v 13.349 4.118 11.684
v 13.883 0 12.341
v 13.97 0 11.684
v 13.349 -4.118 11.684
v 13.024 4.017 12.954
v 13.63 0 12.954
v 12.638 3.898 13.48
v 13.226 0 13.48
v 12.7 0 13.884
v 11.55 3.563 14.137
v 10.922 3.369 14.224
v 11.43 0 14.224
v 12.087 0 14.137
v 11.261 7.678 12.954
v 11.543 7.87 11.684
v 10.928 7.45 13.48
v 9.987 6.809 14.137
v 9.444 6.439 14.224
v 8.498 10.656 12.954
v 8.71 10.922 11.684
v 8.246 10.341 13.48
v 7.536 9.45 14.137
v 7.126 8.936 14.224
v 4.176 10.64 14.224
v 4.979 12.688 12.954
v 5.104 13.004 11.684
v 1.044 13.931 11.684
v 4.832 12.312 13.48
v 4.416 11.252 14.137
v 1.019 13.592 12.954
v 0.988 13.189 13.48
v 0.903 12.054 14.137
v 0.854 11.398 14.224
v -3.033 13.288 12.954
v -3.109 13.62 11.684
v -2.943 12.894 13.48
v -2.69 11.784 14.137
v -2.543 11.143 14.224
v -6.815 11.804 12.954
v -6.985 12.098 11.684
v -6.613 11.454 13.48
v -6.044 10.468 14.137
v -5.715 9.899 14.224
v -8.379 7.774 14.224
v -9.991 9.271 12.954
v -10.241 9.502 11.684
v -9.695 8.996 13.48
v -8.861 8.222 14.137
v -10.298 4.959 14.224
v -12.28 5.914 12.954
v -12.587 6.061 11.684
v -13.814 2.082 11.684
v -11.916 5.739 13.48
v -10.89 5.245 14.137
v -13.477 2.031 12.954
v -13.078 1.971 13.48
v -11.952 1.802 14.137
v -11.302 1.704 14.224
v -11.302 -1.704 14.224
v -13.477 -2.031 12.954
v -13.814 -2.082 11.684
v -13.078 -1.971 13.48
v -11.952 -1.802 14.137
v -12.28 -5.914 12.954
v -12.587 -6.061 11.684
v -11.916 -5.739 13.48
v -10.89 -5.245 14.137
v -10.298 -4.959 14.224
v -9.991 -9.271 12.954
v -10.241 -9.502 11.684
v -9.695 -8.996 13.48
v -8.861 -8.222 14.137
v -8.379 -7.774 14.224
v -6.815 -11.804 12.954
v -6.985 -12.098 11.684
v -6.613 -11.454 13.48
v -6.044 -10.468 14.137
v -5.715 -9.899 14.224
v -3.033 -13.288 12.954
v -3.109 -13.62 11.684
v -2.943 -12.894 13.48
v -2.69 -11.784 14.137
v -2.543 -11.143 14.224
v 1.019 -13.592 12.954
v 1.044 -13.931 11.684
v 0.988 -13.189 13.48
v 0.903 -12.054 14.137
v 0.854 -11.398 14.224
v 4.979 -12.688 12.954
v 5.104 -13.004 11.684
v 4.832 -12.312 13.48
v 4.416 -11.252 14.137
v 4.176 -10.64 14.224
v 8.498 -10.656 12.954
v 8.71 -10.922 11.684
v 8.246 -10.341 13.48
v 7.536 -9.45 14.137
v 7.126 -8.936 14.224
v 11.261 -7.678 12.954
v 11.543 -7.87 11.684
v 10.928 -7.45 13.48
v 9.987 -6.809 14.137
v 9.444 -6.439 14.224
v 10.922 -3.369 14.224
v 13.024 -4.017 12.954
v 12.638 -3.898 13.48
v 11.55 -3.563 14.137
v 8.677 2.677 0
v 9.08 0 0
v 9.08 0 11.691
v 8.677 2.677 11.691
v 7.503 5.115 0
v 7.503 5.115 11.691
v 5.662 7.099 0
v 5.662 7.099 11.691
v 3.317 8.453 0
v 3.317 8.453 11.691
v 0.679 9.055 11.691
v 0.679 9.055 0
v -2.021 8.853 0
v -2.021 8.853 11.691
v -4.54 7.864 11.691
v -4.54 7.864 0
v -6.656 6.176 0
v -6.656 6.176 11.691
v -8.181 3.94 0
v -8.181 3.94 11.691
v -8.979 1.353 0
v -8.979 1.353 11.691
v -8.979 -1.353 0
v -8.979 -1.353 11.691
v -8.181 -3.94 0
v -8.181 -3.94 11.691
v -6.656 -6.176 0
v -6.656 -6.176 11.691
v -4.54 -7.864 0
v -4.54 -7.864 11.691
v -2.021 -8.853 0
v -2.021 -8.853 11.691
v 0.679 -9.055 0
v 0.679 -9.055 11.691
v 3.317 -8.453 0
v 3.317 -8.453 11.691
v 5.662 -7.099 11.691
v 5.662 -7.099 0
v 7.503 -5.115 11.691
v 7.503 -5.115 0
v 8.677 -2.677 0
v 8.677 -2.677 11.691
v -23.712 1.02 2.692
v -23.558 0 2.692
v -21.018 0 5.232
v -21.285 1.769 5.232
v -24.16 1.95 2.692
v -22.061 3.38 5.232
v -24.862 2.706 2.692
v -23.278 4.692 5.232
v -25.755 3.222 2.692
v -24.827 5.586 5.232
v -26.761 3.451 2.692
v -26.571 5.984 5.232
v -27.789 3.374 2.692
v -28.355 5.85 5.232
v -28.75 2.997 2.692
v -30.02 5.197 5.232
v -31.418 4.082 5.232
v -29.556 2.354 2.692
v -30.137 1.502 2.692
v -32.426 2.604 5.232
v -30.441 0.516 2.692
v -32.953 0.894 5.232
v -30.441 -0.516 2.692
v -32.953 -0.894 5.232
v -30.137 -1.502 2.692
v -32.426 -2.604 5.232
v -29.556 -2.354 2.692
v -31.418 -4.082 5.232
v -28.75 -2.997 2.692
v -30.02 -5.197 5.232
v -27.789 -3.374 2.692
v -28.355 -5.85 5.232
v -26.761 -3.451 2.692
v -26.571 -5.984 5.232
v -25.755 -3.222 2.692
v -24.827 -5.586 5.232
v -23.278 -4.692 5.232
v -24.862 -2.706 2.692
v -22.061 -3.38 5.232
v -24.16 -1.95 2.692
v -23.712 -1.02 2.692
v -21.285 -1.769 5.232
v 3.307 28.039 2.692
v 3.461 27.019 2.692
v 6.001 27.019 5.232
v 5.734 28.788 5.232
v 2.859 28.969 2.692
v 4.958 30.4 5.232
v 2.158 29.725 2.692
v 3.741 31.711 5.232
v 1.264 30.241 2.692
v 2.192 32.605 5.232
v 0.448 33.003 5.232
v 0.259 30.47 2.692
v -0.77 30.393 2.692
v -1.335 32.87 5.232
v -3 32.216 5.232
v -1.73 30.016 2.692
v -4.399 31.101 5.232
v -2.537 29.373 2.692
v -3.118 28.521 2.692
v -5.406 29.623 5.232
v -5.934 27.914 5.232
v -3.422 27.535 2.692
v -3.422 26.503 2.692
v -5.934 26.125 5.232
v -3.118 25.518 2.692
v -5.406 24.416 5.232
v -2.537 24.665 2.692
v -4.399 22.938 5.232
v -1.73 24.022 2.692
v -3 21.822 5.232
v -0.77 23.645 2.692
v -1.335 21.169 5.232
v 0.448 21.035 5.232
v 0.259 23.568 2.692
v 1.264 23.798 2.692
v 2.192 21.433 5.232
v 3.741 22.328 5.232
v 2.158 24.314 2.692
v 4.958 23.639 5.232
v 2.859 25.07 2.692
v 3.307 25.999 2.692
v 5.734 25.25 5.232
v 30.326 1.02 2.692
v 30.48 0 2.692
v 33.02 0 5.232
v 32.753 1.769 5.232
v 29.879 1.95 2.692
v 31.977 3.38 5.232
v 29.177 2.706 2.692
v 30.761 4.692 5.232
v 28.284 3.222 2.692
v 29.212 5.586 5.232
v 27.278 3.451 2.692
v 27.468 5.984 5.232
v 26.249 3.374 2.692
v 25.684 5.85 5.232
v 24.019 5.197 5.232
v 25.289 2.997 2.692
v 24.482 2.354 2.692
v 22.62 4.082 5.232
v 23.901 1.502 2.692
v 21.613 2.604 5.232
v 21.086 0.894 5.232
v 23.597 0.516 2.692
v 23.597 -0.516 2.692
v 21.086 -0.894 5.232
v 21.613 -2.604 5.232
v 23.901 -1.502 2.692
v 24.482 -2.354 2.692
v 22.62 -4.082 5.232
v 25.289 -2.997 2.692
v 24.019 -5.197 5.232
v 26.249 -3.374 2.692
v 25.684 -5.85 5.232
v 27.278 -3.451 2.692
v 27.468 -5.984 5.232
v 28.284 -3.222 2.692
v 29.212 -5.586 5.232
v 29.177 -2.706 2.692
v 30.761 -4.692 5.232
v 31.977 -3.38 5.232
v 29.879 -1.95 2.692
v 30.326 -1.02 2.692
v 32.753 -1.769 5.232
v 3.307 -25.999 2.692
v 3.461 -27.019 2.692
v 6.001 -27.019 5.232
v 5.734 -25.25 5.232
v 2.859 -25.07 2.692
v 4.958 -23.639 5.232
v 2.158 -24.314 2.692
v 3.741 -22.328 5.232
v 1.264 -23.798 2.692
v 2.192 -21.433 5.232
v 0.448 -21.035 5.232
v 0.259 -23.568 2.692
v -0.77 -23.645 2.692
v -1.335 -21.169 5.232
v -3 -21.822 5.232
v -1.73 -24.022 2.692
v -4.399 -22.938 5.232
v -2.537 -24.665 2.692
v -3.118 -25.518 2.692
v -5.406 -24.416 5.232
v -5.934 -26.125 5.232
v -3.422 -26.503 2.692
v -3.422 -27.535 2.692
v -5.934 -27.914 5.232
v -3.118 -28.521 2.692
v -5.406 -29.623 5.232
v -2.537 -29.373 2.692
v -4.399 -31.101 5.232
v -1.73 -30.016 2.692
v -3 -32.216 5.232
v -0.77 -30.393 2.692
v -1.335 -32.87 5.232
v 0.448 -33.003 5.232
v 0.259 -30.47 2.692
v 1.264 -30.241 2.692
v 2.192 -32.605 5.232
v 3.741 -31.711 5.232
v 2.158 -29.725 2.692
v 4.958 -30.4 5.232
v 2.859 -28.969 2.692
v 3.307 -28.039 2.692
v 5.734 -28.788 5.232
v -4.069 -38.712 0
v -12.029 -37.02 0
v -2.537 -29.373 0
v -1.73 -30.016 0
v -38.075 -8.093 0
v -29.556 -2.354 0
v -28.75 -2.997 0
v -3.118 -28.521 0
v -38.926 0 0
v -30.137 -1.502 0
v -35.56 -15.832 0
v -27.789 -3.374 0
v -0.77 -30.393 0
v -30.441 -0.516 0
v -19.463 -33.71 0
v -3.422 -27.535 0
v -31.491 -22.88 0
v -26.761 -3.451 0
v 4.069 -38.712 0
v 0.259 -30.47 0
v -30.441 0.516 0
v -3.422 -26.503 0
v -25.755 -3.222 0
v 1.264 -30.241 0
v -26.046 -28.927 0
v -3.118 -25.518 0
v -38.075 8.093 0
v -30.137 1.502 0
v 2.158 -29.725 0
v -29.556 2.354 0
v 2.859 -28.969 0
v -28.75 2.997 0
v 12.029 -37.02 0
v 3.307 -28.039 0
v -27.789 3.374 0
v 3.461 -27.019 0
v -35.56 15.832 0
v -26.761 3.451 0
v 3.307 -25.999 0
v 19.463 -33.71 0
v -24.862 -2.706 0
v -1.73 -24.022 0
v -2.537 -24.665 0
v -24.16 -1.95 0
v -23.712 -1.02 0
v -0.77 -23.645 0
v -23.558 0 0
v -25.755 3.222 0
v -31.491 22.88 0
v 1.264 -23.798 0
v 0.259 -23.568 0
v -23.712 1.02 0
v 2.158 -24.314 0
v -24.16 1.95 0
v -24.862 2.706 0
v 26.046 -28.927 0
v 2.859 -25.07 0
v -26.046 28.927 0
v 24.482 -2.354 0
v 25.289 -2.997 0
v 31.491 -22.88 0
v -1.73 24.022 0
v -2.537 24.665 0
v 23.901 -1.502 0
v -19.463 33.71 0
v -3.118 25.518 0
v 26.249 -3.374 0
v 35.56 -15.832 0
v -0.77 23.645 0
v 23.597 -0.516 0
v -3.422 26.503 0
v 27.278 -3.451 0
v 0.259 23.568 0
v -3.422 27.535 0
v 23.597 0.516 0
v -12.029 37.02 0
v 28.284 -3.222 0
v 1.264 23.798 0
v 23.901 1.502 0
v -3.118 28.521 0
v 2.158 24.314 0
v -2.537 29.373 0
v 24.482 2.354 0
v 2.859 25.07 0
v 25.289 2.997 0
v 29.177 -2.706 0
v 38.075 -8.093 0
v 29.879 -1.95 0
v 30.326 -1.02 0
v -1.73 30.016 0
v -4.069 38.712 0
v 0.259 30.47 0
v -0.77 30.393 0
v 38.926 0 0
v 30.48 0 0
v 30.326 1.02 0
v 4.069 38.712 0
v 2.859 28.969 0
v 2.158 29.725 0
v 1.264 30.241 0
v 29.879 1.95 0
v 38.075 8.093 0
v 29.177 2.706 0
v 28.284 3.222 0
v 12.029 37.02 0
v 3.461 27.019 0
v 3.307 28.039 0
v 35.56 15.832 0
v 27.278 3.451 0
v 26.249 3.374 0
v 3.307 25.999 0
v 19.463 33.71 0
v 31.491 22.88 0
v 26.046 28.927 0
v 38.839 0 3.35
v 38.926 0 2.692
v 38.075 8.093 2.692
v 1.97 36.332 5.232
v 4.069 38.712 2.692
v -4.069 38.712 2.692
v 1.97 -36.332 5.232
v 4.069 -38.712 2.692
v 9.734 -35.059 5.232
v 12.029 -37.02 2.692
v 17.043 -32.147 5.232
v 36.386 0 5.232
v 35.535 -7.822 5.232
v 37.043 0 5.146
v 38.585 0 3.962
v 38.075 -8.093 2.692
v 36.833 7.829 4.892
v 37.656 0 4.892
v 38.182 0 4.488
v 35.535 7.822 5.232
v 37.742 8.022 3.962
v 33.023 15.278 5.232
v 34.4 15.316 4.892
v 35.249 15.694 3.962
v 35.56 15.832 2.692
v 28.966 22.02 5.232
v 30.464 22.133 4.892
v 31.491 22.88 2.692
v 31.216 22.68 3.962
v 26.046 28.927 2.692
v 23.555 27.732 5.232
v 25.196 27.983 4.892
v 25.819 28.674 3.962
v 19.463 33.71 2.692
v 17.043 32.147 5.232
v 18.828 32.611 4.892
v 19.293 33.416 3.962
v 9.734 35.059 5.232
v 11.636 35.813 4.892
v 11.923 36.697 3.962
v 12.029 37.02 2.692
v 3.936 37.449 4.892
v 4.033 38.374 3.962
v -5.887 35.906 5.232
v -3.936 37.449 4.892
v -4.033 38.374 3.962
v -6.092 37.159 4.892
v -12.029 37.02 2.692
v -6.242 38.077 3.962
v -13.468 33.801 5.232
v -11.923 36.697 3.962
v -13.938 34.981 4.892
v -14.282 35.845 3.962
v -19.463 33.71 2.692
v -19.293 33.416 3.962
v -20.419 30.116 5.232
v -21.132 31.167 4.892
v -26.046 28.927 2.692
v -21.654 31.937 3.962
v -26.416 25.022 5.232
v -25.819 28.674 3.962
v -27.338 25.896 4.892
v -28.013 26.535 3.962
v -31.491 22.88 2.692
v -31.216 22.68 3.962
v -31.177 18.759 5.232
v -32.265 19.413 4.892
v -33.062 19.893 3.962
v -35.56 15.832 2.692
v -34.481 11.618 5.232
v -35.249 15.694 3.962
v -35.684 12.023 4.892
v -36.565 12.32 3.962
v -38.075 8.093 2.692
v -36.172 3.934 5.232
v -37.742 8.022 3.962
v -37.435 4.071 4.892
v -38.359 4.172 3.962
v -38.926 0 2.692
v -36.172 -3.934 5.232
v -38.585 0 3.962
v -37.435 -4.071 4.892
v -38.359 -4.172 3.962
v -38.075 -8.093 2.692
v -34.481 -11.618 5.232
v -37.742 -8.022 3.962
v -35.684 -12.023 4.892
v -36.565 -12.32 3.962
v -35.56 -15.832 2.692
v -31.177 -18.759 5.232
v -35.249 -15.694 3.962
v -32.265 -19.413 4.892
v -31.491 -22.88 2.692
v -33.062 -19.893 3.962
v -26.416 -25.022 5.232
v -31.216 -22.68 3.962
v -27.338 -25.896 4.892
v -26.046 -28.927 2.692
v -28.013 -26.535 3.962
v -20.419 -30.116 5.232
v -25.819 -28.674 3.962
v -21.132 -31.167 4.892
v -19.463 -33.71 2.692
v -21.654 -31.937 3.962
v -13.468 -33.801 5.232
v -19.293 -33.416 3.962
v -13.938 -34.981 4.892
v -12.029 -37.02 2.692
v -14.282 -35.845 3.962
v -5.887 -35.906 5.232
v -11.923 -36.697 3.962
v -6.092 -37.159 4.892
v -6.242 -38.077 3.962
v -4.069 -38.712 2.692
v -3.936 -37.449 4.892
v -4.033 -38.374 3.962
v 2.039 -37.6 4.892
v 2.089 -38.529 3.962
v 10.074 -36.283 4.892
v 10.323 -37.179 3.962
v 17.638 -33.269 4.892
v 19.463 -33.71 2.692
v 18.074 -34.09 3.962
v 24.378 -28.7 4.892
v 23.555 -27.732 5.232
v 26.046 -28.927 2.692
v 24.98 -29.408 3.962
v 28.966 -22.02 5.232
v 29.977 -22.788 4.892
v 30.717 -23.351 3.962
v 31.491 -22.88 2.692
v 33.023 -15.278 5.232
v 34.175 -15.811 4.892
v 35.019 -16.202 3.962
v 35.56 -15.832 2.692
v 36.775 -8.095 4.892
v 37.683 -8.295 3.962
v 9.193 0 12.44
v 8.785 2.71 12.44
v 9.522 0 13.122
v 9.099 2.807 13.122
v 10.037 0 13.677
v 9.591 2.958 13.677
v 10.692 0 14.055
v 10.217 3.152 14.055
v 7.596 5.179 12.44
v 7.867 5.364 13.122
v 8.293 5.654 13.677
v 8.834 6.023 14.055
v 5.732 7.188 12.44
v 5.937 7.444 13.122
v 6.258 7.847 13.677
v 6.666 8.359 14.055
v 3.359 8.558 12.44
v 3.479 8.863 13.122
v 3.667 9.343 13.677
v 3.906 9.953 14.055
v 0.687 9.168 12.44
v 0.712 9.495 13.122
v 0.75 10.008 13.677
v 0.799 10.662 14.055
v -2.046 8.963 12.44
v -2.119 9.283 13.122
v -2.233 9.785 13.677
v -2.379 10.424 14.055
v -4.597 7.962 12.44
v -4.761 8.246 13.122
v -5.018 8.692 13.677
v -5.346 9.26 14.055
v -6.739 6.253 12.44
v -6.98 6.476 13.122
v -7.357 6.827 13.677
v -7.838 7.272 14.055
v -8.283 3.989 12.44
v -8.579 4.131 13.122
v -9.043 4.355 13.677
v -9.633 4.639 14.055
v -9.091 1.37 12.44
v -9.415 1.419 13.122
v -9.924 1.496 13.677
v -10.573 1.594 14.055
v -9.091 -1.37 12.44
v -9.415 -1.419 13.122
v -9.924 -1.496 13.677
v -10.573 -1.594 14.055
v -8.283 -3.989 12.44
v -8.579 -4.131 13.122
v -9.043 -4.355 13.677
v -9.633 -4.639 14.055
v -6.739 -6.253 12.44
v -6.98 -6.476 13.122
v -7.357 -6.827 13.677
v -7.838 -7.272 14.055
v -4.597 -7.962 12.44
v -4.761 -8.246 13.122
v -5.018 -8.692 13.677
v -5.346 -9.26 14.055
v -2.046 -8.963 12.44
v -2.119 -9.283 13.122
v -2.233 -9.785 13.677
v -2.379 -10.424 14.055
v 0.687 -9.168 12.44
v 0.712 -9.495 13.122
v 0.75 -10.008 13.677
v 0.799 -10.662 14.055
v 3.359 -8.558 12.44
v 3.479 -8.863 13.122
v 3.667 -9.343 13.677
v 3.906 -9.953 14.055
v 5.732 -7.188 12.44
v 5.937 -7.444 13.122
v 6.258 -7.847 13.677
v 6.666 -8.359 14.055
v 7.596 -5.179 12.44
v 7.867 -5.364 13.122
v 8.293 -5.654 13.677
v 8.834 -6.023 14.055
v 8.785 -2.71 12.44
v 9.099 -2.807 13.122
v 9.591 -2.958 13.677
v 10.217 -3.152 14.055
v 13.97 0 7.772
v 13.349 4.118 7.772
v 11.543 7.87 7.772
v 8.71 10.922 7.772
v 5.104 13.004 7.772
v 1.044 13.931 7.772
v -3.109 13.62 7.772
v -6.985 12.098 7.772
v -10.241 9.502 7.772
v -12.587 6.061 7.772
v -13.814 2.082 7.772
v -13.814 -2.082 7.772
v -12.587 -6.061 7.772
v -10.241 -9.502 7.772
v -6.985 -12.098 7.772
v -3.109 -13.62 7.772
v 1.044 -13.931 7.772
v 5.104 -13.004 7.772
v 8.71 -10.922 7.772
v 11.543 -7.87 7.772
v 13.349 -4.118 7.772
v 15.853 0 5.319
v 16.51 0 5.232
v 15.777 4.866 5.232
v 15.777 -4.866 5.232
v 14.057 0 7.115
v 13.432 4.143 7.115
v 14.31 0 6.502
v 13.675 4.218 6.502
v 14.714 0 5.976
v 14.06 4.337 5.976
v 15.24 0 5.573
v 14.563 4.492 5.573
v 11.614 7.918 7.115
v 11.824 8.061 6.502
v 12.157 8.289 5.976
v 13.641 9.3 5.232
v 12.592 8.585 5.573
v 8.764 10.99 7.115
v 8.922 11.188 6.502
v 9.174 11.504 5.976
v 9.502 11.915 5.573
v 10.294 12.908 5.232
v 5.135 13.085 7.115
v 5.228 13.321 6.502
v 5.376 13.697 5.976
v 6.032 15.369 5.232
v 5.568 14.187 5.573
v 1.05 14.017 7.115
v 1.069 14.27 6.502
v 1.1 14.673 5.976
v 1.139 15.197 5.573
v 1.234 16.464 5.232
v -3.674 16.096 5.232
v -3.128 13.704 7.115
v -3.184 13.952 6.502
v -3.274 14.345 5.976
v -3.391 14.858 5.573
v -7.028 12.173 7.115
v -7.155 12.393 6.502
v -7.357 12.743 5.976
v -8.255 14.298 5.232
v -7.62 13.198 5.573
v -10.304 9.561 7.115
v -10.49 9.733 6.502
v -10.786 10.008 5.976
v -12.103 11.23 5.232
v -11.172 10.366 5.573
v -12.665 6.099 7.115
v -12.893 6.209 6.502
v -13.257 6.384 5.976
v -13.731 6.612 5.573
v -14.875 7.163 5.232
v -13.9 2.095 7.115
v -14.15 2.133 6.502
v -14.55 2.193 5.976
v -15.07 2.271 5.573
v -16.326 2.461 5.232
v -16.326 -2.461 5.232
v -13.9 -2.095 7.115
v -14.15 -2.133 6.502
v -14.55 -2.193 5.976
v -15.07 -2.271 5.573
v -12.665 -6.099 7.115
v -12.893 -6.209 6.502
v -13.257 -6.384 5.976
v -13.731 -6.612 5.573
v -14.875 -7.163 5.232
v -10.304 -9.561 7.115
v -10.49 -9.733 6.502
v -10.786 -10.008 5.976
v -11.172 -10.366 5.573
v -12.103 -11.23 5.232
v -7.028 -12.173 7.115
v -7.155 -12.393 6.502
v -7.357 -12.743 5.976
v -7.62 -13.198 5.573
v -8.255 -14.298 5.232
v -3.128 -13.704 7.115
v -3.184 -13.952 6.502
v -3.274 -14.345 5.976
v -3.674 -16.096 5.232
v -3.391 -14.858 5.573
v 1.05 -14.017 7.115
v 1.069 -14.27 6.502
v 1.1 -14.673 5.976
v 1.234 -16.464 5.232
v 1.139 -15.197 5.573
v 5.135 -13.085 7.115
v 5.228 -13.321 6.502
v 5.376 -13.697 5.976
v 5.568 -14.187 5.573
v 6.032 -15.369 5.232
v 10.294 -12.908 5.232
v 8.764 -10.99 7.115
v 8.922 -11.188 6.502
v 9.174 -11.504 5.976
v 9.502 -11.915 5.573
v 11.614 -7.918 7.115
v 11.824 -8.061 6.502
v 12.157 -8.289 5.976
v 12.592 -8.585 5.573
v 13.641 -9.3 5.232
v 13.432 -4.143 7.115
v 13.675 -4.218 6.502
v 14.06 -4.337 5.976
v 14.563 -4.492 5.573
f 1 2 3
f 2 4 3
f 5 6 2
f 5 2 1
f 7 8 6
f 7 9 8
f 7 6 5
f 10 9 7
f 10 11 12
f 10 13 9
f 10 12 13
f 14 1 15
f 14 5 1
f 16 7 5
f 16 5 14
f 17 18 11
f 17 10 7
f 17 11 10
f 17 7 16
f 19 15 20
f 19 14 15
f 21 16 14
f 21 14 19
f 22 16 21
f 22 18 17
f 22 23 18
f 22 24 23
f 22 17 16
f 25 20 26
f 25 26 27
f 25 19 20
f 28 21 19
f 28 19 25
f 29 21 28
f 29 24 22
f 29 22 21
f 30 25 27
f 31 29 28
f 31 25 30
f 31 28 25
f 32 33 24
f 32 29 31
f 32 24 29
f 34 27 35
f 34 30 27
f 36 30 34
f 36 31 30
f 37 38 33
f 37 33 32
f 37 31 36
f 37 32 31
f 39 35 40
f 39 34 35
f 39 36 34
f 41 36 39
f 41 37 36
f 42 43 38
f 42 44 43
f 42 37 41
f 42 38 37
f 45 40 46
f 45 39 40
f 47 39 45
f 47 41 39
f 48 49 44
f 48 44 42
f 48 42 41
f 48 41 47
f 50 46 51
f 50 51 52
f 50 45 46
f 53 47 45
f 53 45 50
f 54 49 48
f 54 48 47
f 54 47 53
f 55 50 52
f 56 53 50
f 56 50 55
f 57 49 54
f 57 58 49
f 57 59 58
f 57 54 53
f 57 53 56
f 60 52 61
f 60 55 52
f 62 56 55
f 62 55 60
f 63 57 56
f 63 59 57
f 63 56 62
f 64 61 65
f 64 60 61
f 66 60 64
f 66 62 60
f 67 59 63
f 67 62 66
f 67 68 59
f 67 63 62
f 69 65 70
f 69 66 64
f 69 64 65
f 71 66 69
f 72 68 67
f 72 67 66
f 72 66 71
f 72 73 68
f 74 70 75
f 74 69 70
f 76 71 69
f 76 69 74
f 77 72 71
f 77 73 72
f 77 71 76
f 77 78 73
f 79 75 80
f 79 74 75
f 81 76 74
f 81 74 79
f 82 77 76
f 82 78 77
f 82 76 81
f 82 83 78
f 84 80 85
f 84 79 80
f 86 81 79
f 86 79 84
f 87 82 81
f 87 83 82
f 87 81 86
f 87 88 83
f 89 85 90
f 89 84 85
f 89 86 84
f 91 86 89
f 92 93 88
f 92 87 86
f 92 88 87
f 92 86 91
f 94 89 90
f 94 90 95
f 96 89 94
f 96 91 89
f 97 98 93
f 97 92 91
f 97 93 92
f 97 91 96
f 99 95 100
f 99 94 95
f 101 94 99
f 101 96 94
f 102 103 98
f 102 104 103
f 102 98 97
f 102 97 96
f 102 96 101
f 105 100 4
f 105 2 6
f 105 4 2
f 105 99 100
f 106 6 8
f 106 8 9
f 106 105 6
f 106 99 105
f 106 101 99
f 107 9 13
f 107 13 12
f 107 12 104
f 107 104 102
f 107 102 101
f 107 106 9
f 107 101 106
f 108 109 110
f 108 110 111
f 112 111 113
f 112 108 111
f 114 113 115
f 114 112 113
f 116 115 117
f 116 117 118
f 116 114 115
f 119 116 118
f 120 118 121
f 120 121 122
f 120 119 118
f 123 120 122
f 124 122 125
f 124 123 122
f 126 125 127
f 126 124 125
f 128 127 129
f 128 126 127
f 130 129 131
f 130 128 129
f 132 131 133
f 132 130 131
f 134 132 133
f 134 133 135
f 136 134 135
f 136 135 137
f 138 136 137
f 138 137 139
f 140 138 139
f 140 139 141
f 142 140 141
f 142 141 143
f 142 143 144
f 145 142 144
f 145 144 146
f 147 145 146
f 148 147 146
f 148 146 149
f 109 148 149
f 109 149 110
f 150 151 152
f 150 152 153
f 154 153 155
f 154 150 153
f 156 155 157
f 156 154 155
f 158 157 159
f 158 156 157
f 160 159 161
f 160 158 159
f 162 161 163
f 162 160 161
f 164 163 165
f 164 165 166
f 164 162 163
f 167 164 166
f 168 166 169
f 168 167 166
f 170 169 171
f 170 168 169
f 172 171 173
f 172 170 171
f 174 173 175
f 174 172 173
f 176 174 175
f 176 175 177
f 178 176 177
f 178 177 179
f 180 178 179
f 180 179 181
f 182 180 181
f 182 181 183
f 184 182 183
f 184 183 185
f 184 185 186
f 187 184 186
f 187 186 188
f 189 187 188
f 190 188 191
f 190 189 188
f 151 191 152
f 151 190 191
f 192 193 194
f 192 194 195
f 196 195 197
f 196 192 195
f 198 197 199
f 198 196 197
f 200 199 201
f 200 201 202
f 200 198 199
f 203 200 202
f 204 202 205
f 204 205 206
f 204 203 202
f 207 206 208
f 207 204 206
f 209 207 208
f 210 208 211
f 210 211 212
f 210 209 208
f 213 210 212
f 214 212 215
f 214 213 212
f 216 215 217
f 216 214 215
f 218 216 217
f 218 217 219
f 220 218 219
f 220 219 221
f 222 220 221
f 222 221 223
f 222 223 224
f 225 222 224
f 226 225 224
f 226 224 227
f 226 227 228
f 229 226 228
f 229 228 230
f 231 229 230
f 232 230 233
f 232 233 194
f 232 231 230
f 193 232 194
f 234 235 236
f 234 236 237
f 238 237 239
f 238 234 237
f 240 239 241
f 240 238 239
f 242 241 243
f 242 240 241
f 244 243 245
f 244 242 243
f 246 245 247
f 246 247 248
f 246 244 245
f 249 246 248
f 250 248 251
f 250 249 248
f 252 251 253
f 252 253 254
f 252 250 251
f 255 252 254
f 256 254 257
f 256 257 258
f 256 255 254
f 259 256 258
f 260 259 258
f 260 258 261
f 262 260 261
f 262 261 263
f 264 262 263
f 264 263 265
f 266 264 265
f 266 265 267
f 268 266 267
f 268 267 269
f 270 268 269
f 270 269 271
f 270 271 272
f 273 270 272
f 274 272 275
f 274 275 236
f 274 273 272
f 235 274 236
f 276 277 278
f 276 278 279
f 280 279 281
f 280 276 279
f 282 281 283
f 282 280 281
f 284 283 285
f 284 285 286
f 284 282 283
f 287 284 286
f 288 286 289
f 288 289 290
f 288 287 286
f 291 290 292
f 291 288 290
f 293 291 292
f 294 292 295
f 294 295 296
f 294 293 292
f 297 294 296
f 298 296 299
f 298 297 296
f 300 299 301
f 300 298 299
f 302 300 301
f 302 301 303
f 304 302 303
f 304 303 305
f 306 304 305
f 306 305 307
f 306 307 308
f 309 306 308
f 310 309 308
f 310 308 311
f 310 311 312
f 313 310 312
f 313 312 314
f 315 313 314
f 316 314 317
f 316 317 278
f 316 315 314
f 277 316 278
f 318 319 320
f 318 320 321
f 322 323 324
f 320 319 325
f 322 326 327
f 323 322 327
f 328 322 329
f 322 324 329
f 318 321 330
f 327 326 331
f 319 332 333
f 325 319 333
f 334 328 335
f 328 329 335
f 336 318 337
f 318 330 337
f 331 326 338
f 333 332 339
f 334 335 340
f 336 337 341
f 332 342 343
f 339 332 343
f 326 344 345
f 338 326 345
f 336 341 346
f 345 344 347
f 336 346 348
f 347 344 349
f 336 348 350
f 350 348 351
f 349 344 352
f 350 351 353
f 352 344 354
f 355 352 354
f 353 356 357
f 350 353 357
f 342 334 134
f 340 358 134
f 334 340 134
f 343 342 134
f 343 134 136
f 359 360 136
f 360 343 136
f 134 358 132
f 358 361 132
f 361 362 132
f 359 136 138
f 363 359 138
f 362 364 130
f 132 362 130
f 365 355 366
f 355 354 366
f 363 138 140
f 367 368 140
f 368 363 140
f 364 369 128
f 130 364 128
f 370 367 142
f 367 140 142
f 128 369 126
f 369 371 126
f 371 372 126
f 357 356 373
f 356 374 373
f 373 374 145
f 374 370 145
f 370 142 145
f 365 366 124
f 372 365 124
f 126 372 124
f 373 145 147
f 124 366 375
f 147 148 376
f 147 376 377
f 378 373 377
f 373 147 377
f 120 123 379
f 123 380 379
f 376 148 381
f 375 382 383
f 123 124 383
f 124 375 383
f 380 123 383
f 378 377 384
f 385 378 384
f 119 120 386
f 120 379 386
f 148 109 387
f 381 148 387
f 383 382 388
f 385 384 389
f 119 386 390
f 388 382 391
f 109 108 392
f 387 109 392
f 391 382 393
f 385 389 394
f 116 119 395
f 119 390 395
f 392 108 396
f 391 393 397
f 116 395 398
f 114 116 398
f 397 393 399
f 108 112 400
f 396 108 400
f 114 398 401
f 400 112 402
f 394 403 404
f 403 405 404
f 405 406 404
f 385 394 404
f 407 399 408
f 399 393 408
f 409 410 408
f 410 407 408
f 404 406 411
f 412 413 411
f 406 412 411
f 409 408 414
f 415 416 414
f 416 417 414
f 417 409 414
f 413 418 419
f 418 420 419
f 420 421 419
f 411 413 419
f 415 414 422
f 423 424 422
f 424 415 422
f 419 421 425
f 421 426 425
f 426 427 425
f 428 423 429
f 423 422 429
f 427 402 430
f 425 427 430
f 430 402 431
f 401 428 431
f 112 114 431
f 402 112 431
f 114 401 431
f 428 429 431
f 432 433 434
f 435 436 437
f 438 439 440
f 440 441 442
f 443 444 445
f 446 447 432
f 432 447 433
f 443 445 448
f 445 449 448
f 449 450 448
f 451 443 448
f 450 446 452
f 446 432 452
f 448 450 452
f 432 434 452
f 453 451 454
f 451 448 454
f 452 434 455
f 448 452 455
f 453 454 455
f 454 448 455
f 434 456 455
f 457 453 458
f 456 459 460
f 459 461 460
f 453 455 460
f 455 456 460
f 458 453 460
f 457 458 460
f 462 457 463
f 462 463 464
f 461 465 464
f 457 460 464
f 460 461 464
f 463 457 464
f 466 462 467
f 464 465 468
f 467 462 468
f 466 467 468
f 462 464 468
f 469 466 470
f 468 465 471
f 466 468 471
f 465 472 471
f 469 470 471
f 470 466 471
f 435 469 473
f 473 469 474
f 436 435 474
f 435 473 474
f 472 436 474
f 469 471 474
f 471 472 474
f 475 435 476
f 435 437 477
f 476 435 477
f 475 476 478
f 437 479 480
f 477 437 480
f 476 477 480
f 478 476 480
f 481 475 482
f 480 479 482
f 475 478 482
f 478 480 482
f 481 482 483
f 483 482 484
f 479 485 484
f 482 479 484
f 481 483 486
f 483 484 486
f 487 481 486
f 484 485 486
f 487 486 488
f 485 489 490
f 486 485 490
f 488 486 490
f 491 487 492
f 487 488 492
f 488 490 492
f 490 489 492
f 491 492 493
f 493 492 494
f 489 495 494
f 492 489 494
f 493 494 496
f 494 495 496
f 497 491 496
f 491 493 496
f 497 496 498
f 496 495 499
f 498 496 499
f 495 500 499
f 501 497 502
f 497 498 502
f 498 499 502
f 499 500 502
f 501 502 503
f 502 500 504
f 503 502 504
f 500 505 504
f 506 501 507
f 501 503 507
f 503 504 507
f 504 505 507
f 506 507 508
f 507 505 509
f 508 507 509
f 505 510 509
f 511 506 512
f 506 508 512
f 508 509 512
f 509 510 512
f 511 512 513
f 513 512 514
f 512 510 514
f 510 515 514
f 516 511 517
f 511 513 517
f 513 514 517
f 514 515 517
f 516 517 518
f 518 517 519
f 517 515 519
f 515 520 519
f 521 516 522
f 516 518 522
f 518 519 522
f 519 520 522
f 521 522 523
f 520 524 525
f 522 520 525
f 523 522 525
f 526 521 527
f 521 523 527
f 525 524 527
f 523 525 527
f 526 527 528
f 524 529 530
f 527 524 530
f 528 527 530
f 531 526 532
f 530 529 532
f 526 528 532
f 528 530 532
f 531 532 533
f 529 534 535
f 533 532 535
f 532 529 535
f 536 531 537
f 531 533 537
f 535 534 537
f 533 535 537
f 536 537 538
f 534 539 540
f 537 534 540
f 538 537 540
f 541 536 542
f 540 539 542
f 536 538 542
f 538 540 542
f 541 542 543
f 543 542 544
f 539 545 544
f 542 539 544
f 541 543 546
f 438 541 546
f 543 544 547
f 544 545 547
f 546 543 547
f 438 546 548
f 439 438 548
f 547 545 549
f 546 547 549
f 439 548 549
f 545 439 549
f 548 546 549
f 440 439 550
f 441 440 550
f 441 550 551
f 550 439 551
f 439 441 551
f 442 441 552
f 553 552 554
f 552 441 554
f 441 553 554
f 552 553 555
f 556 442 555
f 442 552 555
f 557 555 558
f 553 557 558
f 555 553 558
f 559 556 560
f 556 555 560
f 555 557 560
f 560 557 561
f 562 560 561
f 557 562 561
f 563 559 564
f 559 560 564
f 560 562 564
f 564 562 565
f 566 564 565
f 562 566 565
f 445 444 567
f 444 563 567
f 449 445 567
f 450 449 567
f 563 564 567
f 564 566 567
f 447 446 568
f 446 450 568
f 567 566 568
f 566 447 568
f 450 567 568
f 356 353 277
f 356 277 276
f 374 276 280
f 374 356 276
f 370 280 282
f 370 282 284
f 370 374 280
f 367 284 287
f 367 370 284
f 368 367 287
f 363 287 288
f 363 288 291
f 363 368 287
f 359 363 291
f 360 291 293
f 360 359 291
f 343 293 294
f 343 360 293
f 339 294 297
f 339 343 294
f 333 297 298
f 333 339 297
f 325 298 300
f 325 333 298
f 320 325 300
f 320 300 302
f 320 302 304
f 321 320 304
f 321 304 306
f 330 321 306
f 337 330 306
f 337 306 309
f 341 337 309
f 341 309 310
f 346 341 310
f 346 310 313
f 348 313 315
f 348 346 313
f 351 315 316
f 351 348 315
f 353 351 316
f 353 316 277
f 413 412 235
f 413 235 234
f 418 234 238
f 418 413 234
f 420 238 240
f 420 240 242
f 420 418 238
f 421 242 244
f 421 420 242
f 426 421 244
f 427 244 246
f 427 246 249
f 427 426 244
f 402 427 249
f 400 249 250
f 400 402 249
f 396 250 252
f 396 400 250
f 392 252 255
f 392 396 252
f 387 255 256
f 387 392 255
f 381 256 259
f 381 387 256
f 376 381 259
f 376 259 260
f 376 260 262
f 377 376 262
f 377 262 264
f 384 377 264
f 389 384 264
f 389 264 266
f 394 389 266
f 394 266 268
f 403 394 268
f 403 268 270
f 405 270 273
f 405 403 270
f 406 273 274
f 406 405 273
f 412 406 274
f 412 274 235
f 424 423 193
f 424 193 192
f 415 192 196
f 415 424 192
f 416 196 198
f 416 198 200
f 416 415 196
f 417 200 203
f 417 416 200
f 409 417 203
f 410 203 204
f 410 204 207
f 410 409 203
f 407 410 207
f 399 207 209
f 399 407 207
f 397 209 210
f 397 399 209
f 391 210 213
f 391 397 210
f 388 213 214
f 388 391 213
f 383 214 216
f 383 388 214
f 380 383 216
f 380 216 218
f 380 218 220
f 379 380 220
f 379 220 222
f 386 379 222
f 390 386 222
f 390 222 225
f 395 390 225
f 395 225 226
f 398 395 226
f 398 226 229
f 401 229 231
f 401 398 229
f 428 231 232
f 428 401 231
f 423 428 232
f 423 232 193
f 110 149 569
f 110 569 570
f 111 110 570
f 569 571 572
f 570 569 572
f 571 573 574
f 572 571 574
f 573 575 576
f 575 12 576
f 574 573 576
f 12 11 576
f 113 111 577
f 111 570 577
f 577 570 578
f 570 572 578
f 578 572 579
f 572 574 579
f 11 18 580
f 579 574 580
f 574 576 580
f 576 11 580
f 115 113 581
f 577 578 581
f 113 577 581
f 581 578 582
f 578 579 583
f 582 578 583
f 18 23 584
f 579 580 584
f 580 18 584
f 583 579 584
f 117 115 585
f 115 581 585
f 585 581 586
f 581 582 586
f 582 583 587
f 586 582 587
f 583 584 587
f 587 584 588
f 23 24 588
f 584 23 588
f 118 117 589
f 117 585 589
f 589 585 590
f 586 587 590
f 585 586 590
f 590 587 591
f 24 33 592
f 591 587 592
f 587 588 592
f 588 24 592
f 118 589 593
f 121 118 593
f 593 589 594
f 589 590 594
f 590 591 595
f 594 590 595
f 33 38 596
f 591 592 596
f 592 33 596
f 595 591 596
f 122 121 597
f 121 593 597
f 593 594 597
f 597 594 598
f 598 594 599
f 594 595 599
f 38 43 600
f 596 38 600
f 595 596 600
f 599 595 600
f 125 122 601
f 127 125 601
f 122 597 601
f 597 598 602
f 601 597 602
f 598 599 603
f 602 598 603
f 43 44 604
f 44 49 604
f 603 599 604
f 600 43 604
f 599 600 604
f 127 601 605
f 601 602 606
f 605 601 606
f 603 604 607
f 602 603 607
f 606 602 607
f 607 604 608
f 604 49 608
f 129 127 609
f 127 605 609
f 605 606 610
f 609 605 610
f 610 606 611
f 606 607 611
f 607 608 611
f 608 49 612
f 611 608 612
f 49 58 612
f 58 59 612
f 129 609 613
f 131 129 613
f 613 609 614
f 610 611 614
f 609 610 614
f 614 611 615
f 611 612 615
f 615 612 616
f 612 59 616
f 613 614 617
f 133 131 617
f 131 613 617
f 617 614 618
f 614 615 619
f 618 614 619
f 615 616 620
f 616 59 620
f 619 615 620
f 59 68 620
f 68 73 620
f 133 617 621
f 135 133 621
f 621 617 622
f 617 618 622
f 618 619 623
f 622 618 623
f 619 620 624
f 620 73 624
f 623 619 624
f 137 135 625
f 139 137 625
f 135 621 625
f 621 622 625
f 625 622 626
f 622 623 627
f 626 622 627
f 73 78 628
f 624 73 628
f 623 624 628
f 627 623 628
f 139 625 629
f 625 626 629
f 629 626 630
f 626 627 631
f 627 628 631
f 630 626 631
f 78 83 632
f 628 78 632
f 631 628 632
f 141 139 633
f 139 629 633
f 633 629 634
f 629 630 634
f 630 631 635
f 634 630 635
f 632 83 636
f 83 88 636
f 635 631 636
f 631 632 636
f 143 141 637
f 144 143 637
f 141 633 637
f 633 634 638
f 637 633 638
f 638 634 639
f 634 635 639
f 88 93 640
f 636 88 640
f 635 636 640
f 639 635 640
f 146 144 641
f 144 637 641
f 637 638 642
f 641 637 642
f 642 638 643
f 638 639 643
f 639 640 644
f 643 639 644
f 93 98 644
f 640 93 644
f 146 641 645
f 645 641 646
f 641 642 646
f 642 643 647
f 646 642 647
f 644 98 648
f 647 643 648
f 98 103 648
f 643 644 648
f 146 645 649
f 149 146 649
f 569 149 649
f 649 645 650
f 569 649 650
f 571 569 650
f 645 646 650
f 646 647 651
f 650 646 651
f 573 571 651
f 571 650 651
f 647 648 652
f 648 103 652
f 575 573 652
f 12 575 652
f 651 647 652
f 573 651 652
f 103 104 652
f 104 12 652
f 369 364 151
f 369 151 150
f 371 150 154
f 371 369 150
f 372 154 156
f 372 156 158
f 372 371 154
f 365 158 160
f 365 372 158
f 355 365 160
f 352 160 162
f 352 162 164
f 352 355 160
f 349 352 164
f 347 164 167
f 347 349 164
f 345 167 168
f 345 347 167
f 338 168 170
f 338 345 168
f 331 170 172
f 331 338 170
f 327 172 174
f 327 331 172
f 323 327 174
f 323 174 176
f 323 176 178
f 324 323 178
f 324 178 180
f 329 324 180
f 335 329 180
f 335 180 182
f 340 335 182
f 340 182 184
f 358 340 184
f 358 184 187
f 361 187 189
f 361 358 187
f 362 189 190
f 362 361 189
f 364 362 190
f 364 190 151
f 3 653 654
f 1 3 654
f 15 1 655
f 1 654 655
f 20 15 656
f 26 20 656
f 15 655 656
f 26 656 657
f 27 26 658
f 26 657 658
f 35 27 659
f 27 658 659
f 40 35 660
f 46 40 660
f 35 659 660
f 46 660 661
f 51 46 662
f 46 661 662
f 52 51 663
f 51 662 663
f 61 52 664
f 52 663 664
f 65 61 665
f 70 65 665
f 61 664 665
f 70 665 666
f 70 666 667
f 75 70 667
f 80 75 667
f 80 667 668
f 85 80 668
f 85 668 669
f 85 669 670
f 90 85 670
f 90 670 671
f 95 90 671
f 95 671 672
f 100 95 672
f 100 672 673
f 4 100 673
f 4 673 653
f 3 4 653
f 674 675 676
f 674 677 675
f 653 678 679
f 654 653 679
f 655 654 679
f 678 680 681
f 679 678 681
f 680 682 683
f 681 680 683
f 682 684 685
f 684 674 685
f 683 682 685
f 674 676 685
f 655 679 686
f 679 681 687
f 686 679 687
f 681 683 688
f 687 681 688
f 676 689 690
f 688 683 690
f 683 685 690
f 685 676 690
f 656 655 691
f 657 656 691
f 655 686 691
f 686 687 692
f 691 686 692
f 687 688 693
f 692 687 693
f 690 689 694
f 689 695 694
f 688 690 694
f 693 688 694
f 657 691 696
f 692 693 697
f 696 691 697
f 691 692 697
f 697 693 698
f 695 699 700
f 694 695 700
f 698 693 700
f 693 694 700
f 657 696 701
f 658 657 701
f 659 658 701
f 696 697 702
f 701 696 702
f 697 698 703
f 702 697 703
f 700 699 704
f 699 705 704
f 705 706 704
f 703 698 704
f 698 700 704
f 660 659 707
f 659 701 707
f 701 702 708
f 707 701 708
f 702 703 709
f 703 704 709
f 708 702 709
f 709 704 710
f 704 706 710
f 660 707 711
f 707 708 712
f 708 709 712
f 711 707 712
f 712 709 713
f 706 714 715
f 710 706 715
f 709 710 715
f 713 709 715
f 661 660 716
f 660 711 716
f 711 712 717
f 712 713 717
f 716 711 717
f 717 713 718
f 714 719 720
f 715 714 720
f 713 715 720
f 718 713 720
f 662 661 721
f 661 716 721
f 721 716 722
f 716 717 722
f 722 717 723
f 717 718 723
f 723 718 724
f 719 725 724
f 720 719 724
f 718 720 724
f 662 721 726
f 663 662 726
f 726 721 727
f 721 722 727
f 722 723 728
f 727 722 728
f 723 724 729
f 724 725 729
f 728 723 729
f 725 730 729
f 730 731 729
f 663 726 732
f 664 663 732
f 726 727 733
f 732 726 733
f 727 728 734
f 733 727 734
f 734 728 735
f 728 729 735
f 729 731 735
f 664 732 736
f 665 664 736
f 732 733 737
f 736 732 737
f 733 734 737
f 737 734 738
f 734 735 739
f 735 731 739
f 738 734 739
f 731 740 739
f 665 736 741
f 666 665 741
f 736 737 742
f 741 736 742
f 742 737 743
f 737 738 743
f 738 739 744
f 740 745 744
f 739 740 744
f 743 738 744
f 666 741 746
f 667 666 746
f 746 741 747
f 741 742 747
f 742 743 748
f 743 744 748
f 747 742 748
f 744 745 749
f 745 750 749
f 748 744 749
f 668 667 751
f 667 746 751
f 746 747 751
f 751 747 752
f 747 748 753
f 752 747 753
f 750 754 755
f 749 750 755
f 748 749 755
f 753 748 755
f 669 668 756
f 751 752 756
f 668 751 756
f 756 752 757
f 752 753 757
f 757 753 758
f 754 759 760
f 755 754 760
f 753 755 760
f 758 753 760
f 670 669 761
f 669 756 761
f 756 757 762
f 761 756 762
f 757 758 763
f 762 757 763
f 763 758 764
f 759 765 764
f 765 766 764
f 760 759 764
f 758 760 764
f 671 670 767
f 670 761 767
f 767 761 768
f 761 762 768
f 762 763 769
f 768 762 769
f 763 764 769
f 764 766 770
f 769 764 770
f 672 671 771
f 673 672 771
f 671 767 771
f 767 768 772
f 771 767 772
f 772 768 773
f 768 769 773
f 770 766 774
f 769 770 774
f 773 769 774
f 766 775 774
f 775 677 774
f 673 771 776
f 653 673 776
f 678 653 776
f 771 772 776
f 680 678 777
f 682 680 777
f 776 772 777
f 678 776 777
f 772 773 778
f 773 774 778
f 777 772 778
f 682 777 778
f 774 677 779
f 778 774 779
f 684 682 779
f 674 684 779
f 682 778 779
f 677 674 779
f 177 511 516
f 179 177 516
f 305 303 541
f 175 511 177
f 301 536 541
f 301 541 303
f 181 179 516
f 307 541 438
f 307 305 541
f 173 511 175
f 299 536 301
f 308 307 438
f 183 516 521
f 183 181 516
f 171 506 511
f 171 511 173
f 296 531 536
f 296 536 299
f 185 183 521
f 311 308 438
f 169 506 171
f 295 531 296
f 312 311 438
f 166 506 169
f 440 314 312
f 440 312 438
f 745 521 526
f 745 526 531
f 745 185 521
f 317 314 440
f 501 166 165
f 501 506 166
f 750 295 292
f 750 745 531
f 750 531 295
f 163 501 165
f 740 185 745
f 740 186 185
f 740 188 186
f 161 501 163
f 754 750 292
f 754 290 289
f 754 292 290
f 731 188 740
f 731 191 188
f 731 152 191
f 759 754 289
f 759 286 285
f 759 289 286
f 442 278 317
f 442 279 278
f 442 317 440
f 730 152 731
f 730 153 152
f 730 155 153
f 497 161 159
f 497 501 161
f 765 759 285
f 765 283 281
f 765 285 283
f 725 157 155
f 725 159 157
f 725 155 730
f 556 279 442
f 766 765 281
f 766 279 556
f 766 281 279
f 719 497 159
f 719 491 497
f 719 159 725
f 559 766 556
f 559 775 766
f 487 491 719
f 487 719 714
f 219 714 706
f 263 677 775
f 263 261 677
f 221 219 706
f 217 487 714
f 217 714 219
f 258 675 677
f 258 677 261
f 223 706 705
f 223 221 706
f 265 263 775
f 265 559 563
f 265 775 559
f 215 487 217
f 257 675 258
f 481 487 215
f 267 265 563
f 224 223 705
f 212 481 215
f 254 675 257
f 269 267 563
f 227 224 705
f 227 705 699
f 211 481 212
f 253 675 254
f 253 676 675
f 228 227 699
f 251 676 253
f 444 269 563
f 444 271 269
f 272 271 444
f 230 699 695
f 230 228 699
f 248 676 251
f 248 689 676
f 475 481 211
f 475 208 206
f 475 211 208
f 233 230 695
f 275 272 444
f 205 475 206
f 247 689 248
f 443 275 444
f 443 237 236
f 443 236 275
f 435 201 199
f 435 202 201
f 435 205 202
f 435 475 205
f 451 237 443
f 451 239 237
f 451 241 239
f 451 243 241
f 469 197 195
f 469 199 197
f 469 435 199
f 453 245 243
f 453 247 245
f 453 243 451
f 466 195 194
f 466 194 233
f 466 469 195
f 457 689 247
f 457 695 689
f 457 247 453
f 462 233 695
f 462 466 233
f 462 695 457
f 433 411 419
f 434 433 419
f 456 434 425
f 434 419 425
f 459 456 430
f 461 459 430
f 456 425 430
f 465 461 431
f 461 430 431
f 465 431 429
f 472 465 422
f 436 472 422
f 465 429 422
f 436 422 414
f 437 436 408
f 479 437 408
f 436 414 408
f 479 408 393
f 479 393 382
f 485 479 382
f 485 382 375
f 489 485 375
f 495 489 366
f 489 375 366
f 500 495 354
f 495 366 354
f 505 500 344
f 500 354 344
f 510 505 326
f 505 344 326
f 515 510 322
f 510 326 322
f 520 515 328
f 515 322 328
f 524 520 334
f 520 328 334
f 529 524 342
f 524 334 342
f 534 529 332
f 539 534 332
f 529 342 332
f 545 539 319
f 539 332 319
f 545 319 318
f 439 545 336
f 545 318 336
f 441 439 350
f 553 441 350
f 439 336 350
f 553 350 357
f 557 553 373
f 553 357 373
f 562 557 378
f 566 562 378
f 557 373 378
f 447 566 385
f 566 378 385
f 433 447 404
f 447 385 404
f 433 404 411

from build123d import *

# Parameters (mm, degrees)
F0_R     = 38.9255
F0_R_2   = 3.46075
F0_R_3   = 13.97
F1_DEPTH = 5.2324
F0_R_4   = 9.0805
F2_DEPTH = 14.224
F3_R     = 2.54
F5_SIZE  = 2.54


# Not quite as in the source:
# - a fillet or chamfer that OpenCascade refuses, or shapes differently, is made with other operations: its cross-section is extruded or revolved along the edge and cut away or added


with BuildPart() as f1:
    # F0 (on Top) → F1 (new body)
    with BuildSketch(Plane.XY):
        Circle(F0_R)
        with Locations((0, -27.01925)):
            Circle(F0_R_2, mode=Mode.SUBTRACT)
        with Locations((-27.01925, 0)):
            Circle(F0_R_2, mode=Mode.SUBTRACT)
        Circle(F0_R_3, mode=Mode.SUBTRACT)
        with Locations((27.01925, 0)):
            Circle(F0_R_2, mode=Mode.SUBTRACT)
        with Locations((0, 27.01925)):
            Circle(F0_R_2, mode=Mode.SUBTRACT)
    extrude(amount=F1_DEPTH)

    # F0 (on Top) → F2 (join)
    with BuildSketch(Plane.XY):
        Circle(F0_R_3)
        Circle(F0_R_4, mode=Mode.SUBTRACT)
    extrude(amount=F2_DEPTH)

    # F3
    f3_edges = [f1.edges().sort_by_distance(p)[0] for p in [
        (-38.9255, 0, 5.2324),
        (-13.97, 0, 14.224),
        (-13.97, 0, 5.2324),
    ]]
    fillet(f3_edges, radius=F3_R)

    # F4: fillet of radius 2.54 on 1 edges, made by hand

    # F4_s1 → F4_t2 (revolve, cut)
    with BuildSketch(Plane.XZ):
        with BuildLine():
            ThreePointArc((9.0805, 11.6911538243), (9.7583144561, 13.4185405789), (11.43, 14.224))
            Line((11.43, 14.224), (9.0805, 14.224))
            Line((9.0805, 14.224), (9.0805, 11.6911538243))
        make_face()
    revolve(axis=Axis((0, 0, 14.224), (0, 0, 1)), mode=Mode.SUBTRACT)

    # F5
    f5_edges = [f1.edges().sort_by_distance(p)[0] for p in [
        (-3.46075, 27.01925, 5.2324),
        (23.5585, 0, 5.2324),
        (-3.46075, -27.01925, 5.2324),
        (-30.48, 0, 5.2324),
    ]]
    chamfer(f5_edges, length=F5_SIZE)


solid = f1.part
